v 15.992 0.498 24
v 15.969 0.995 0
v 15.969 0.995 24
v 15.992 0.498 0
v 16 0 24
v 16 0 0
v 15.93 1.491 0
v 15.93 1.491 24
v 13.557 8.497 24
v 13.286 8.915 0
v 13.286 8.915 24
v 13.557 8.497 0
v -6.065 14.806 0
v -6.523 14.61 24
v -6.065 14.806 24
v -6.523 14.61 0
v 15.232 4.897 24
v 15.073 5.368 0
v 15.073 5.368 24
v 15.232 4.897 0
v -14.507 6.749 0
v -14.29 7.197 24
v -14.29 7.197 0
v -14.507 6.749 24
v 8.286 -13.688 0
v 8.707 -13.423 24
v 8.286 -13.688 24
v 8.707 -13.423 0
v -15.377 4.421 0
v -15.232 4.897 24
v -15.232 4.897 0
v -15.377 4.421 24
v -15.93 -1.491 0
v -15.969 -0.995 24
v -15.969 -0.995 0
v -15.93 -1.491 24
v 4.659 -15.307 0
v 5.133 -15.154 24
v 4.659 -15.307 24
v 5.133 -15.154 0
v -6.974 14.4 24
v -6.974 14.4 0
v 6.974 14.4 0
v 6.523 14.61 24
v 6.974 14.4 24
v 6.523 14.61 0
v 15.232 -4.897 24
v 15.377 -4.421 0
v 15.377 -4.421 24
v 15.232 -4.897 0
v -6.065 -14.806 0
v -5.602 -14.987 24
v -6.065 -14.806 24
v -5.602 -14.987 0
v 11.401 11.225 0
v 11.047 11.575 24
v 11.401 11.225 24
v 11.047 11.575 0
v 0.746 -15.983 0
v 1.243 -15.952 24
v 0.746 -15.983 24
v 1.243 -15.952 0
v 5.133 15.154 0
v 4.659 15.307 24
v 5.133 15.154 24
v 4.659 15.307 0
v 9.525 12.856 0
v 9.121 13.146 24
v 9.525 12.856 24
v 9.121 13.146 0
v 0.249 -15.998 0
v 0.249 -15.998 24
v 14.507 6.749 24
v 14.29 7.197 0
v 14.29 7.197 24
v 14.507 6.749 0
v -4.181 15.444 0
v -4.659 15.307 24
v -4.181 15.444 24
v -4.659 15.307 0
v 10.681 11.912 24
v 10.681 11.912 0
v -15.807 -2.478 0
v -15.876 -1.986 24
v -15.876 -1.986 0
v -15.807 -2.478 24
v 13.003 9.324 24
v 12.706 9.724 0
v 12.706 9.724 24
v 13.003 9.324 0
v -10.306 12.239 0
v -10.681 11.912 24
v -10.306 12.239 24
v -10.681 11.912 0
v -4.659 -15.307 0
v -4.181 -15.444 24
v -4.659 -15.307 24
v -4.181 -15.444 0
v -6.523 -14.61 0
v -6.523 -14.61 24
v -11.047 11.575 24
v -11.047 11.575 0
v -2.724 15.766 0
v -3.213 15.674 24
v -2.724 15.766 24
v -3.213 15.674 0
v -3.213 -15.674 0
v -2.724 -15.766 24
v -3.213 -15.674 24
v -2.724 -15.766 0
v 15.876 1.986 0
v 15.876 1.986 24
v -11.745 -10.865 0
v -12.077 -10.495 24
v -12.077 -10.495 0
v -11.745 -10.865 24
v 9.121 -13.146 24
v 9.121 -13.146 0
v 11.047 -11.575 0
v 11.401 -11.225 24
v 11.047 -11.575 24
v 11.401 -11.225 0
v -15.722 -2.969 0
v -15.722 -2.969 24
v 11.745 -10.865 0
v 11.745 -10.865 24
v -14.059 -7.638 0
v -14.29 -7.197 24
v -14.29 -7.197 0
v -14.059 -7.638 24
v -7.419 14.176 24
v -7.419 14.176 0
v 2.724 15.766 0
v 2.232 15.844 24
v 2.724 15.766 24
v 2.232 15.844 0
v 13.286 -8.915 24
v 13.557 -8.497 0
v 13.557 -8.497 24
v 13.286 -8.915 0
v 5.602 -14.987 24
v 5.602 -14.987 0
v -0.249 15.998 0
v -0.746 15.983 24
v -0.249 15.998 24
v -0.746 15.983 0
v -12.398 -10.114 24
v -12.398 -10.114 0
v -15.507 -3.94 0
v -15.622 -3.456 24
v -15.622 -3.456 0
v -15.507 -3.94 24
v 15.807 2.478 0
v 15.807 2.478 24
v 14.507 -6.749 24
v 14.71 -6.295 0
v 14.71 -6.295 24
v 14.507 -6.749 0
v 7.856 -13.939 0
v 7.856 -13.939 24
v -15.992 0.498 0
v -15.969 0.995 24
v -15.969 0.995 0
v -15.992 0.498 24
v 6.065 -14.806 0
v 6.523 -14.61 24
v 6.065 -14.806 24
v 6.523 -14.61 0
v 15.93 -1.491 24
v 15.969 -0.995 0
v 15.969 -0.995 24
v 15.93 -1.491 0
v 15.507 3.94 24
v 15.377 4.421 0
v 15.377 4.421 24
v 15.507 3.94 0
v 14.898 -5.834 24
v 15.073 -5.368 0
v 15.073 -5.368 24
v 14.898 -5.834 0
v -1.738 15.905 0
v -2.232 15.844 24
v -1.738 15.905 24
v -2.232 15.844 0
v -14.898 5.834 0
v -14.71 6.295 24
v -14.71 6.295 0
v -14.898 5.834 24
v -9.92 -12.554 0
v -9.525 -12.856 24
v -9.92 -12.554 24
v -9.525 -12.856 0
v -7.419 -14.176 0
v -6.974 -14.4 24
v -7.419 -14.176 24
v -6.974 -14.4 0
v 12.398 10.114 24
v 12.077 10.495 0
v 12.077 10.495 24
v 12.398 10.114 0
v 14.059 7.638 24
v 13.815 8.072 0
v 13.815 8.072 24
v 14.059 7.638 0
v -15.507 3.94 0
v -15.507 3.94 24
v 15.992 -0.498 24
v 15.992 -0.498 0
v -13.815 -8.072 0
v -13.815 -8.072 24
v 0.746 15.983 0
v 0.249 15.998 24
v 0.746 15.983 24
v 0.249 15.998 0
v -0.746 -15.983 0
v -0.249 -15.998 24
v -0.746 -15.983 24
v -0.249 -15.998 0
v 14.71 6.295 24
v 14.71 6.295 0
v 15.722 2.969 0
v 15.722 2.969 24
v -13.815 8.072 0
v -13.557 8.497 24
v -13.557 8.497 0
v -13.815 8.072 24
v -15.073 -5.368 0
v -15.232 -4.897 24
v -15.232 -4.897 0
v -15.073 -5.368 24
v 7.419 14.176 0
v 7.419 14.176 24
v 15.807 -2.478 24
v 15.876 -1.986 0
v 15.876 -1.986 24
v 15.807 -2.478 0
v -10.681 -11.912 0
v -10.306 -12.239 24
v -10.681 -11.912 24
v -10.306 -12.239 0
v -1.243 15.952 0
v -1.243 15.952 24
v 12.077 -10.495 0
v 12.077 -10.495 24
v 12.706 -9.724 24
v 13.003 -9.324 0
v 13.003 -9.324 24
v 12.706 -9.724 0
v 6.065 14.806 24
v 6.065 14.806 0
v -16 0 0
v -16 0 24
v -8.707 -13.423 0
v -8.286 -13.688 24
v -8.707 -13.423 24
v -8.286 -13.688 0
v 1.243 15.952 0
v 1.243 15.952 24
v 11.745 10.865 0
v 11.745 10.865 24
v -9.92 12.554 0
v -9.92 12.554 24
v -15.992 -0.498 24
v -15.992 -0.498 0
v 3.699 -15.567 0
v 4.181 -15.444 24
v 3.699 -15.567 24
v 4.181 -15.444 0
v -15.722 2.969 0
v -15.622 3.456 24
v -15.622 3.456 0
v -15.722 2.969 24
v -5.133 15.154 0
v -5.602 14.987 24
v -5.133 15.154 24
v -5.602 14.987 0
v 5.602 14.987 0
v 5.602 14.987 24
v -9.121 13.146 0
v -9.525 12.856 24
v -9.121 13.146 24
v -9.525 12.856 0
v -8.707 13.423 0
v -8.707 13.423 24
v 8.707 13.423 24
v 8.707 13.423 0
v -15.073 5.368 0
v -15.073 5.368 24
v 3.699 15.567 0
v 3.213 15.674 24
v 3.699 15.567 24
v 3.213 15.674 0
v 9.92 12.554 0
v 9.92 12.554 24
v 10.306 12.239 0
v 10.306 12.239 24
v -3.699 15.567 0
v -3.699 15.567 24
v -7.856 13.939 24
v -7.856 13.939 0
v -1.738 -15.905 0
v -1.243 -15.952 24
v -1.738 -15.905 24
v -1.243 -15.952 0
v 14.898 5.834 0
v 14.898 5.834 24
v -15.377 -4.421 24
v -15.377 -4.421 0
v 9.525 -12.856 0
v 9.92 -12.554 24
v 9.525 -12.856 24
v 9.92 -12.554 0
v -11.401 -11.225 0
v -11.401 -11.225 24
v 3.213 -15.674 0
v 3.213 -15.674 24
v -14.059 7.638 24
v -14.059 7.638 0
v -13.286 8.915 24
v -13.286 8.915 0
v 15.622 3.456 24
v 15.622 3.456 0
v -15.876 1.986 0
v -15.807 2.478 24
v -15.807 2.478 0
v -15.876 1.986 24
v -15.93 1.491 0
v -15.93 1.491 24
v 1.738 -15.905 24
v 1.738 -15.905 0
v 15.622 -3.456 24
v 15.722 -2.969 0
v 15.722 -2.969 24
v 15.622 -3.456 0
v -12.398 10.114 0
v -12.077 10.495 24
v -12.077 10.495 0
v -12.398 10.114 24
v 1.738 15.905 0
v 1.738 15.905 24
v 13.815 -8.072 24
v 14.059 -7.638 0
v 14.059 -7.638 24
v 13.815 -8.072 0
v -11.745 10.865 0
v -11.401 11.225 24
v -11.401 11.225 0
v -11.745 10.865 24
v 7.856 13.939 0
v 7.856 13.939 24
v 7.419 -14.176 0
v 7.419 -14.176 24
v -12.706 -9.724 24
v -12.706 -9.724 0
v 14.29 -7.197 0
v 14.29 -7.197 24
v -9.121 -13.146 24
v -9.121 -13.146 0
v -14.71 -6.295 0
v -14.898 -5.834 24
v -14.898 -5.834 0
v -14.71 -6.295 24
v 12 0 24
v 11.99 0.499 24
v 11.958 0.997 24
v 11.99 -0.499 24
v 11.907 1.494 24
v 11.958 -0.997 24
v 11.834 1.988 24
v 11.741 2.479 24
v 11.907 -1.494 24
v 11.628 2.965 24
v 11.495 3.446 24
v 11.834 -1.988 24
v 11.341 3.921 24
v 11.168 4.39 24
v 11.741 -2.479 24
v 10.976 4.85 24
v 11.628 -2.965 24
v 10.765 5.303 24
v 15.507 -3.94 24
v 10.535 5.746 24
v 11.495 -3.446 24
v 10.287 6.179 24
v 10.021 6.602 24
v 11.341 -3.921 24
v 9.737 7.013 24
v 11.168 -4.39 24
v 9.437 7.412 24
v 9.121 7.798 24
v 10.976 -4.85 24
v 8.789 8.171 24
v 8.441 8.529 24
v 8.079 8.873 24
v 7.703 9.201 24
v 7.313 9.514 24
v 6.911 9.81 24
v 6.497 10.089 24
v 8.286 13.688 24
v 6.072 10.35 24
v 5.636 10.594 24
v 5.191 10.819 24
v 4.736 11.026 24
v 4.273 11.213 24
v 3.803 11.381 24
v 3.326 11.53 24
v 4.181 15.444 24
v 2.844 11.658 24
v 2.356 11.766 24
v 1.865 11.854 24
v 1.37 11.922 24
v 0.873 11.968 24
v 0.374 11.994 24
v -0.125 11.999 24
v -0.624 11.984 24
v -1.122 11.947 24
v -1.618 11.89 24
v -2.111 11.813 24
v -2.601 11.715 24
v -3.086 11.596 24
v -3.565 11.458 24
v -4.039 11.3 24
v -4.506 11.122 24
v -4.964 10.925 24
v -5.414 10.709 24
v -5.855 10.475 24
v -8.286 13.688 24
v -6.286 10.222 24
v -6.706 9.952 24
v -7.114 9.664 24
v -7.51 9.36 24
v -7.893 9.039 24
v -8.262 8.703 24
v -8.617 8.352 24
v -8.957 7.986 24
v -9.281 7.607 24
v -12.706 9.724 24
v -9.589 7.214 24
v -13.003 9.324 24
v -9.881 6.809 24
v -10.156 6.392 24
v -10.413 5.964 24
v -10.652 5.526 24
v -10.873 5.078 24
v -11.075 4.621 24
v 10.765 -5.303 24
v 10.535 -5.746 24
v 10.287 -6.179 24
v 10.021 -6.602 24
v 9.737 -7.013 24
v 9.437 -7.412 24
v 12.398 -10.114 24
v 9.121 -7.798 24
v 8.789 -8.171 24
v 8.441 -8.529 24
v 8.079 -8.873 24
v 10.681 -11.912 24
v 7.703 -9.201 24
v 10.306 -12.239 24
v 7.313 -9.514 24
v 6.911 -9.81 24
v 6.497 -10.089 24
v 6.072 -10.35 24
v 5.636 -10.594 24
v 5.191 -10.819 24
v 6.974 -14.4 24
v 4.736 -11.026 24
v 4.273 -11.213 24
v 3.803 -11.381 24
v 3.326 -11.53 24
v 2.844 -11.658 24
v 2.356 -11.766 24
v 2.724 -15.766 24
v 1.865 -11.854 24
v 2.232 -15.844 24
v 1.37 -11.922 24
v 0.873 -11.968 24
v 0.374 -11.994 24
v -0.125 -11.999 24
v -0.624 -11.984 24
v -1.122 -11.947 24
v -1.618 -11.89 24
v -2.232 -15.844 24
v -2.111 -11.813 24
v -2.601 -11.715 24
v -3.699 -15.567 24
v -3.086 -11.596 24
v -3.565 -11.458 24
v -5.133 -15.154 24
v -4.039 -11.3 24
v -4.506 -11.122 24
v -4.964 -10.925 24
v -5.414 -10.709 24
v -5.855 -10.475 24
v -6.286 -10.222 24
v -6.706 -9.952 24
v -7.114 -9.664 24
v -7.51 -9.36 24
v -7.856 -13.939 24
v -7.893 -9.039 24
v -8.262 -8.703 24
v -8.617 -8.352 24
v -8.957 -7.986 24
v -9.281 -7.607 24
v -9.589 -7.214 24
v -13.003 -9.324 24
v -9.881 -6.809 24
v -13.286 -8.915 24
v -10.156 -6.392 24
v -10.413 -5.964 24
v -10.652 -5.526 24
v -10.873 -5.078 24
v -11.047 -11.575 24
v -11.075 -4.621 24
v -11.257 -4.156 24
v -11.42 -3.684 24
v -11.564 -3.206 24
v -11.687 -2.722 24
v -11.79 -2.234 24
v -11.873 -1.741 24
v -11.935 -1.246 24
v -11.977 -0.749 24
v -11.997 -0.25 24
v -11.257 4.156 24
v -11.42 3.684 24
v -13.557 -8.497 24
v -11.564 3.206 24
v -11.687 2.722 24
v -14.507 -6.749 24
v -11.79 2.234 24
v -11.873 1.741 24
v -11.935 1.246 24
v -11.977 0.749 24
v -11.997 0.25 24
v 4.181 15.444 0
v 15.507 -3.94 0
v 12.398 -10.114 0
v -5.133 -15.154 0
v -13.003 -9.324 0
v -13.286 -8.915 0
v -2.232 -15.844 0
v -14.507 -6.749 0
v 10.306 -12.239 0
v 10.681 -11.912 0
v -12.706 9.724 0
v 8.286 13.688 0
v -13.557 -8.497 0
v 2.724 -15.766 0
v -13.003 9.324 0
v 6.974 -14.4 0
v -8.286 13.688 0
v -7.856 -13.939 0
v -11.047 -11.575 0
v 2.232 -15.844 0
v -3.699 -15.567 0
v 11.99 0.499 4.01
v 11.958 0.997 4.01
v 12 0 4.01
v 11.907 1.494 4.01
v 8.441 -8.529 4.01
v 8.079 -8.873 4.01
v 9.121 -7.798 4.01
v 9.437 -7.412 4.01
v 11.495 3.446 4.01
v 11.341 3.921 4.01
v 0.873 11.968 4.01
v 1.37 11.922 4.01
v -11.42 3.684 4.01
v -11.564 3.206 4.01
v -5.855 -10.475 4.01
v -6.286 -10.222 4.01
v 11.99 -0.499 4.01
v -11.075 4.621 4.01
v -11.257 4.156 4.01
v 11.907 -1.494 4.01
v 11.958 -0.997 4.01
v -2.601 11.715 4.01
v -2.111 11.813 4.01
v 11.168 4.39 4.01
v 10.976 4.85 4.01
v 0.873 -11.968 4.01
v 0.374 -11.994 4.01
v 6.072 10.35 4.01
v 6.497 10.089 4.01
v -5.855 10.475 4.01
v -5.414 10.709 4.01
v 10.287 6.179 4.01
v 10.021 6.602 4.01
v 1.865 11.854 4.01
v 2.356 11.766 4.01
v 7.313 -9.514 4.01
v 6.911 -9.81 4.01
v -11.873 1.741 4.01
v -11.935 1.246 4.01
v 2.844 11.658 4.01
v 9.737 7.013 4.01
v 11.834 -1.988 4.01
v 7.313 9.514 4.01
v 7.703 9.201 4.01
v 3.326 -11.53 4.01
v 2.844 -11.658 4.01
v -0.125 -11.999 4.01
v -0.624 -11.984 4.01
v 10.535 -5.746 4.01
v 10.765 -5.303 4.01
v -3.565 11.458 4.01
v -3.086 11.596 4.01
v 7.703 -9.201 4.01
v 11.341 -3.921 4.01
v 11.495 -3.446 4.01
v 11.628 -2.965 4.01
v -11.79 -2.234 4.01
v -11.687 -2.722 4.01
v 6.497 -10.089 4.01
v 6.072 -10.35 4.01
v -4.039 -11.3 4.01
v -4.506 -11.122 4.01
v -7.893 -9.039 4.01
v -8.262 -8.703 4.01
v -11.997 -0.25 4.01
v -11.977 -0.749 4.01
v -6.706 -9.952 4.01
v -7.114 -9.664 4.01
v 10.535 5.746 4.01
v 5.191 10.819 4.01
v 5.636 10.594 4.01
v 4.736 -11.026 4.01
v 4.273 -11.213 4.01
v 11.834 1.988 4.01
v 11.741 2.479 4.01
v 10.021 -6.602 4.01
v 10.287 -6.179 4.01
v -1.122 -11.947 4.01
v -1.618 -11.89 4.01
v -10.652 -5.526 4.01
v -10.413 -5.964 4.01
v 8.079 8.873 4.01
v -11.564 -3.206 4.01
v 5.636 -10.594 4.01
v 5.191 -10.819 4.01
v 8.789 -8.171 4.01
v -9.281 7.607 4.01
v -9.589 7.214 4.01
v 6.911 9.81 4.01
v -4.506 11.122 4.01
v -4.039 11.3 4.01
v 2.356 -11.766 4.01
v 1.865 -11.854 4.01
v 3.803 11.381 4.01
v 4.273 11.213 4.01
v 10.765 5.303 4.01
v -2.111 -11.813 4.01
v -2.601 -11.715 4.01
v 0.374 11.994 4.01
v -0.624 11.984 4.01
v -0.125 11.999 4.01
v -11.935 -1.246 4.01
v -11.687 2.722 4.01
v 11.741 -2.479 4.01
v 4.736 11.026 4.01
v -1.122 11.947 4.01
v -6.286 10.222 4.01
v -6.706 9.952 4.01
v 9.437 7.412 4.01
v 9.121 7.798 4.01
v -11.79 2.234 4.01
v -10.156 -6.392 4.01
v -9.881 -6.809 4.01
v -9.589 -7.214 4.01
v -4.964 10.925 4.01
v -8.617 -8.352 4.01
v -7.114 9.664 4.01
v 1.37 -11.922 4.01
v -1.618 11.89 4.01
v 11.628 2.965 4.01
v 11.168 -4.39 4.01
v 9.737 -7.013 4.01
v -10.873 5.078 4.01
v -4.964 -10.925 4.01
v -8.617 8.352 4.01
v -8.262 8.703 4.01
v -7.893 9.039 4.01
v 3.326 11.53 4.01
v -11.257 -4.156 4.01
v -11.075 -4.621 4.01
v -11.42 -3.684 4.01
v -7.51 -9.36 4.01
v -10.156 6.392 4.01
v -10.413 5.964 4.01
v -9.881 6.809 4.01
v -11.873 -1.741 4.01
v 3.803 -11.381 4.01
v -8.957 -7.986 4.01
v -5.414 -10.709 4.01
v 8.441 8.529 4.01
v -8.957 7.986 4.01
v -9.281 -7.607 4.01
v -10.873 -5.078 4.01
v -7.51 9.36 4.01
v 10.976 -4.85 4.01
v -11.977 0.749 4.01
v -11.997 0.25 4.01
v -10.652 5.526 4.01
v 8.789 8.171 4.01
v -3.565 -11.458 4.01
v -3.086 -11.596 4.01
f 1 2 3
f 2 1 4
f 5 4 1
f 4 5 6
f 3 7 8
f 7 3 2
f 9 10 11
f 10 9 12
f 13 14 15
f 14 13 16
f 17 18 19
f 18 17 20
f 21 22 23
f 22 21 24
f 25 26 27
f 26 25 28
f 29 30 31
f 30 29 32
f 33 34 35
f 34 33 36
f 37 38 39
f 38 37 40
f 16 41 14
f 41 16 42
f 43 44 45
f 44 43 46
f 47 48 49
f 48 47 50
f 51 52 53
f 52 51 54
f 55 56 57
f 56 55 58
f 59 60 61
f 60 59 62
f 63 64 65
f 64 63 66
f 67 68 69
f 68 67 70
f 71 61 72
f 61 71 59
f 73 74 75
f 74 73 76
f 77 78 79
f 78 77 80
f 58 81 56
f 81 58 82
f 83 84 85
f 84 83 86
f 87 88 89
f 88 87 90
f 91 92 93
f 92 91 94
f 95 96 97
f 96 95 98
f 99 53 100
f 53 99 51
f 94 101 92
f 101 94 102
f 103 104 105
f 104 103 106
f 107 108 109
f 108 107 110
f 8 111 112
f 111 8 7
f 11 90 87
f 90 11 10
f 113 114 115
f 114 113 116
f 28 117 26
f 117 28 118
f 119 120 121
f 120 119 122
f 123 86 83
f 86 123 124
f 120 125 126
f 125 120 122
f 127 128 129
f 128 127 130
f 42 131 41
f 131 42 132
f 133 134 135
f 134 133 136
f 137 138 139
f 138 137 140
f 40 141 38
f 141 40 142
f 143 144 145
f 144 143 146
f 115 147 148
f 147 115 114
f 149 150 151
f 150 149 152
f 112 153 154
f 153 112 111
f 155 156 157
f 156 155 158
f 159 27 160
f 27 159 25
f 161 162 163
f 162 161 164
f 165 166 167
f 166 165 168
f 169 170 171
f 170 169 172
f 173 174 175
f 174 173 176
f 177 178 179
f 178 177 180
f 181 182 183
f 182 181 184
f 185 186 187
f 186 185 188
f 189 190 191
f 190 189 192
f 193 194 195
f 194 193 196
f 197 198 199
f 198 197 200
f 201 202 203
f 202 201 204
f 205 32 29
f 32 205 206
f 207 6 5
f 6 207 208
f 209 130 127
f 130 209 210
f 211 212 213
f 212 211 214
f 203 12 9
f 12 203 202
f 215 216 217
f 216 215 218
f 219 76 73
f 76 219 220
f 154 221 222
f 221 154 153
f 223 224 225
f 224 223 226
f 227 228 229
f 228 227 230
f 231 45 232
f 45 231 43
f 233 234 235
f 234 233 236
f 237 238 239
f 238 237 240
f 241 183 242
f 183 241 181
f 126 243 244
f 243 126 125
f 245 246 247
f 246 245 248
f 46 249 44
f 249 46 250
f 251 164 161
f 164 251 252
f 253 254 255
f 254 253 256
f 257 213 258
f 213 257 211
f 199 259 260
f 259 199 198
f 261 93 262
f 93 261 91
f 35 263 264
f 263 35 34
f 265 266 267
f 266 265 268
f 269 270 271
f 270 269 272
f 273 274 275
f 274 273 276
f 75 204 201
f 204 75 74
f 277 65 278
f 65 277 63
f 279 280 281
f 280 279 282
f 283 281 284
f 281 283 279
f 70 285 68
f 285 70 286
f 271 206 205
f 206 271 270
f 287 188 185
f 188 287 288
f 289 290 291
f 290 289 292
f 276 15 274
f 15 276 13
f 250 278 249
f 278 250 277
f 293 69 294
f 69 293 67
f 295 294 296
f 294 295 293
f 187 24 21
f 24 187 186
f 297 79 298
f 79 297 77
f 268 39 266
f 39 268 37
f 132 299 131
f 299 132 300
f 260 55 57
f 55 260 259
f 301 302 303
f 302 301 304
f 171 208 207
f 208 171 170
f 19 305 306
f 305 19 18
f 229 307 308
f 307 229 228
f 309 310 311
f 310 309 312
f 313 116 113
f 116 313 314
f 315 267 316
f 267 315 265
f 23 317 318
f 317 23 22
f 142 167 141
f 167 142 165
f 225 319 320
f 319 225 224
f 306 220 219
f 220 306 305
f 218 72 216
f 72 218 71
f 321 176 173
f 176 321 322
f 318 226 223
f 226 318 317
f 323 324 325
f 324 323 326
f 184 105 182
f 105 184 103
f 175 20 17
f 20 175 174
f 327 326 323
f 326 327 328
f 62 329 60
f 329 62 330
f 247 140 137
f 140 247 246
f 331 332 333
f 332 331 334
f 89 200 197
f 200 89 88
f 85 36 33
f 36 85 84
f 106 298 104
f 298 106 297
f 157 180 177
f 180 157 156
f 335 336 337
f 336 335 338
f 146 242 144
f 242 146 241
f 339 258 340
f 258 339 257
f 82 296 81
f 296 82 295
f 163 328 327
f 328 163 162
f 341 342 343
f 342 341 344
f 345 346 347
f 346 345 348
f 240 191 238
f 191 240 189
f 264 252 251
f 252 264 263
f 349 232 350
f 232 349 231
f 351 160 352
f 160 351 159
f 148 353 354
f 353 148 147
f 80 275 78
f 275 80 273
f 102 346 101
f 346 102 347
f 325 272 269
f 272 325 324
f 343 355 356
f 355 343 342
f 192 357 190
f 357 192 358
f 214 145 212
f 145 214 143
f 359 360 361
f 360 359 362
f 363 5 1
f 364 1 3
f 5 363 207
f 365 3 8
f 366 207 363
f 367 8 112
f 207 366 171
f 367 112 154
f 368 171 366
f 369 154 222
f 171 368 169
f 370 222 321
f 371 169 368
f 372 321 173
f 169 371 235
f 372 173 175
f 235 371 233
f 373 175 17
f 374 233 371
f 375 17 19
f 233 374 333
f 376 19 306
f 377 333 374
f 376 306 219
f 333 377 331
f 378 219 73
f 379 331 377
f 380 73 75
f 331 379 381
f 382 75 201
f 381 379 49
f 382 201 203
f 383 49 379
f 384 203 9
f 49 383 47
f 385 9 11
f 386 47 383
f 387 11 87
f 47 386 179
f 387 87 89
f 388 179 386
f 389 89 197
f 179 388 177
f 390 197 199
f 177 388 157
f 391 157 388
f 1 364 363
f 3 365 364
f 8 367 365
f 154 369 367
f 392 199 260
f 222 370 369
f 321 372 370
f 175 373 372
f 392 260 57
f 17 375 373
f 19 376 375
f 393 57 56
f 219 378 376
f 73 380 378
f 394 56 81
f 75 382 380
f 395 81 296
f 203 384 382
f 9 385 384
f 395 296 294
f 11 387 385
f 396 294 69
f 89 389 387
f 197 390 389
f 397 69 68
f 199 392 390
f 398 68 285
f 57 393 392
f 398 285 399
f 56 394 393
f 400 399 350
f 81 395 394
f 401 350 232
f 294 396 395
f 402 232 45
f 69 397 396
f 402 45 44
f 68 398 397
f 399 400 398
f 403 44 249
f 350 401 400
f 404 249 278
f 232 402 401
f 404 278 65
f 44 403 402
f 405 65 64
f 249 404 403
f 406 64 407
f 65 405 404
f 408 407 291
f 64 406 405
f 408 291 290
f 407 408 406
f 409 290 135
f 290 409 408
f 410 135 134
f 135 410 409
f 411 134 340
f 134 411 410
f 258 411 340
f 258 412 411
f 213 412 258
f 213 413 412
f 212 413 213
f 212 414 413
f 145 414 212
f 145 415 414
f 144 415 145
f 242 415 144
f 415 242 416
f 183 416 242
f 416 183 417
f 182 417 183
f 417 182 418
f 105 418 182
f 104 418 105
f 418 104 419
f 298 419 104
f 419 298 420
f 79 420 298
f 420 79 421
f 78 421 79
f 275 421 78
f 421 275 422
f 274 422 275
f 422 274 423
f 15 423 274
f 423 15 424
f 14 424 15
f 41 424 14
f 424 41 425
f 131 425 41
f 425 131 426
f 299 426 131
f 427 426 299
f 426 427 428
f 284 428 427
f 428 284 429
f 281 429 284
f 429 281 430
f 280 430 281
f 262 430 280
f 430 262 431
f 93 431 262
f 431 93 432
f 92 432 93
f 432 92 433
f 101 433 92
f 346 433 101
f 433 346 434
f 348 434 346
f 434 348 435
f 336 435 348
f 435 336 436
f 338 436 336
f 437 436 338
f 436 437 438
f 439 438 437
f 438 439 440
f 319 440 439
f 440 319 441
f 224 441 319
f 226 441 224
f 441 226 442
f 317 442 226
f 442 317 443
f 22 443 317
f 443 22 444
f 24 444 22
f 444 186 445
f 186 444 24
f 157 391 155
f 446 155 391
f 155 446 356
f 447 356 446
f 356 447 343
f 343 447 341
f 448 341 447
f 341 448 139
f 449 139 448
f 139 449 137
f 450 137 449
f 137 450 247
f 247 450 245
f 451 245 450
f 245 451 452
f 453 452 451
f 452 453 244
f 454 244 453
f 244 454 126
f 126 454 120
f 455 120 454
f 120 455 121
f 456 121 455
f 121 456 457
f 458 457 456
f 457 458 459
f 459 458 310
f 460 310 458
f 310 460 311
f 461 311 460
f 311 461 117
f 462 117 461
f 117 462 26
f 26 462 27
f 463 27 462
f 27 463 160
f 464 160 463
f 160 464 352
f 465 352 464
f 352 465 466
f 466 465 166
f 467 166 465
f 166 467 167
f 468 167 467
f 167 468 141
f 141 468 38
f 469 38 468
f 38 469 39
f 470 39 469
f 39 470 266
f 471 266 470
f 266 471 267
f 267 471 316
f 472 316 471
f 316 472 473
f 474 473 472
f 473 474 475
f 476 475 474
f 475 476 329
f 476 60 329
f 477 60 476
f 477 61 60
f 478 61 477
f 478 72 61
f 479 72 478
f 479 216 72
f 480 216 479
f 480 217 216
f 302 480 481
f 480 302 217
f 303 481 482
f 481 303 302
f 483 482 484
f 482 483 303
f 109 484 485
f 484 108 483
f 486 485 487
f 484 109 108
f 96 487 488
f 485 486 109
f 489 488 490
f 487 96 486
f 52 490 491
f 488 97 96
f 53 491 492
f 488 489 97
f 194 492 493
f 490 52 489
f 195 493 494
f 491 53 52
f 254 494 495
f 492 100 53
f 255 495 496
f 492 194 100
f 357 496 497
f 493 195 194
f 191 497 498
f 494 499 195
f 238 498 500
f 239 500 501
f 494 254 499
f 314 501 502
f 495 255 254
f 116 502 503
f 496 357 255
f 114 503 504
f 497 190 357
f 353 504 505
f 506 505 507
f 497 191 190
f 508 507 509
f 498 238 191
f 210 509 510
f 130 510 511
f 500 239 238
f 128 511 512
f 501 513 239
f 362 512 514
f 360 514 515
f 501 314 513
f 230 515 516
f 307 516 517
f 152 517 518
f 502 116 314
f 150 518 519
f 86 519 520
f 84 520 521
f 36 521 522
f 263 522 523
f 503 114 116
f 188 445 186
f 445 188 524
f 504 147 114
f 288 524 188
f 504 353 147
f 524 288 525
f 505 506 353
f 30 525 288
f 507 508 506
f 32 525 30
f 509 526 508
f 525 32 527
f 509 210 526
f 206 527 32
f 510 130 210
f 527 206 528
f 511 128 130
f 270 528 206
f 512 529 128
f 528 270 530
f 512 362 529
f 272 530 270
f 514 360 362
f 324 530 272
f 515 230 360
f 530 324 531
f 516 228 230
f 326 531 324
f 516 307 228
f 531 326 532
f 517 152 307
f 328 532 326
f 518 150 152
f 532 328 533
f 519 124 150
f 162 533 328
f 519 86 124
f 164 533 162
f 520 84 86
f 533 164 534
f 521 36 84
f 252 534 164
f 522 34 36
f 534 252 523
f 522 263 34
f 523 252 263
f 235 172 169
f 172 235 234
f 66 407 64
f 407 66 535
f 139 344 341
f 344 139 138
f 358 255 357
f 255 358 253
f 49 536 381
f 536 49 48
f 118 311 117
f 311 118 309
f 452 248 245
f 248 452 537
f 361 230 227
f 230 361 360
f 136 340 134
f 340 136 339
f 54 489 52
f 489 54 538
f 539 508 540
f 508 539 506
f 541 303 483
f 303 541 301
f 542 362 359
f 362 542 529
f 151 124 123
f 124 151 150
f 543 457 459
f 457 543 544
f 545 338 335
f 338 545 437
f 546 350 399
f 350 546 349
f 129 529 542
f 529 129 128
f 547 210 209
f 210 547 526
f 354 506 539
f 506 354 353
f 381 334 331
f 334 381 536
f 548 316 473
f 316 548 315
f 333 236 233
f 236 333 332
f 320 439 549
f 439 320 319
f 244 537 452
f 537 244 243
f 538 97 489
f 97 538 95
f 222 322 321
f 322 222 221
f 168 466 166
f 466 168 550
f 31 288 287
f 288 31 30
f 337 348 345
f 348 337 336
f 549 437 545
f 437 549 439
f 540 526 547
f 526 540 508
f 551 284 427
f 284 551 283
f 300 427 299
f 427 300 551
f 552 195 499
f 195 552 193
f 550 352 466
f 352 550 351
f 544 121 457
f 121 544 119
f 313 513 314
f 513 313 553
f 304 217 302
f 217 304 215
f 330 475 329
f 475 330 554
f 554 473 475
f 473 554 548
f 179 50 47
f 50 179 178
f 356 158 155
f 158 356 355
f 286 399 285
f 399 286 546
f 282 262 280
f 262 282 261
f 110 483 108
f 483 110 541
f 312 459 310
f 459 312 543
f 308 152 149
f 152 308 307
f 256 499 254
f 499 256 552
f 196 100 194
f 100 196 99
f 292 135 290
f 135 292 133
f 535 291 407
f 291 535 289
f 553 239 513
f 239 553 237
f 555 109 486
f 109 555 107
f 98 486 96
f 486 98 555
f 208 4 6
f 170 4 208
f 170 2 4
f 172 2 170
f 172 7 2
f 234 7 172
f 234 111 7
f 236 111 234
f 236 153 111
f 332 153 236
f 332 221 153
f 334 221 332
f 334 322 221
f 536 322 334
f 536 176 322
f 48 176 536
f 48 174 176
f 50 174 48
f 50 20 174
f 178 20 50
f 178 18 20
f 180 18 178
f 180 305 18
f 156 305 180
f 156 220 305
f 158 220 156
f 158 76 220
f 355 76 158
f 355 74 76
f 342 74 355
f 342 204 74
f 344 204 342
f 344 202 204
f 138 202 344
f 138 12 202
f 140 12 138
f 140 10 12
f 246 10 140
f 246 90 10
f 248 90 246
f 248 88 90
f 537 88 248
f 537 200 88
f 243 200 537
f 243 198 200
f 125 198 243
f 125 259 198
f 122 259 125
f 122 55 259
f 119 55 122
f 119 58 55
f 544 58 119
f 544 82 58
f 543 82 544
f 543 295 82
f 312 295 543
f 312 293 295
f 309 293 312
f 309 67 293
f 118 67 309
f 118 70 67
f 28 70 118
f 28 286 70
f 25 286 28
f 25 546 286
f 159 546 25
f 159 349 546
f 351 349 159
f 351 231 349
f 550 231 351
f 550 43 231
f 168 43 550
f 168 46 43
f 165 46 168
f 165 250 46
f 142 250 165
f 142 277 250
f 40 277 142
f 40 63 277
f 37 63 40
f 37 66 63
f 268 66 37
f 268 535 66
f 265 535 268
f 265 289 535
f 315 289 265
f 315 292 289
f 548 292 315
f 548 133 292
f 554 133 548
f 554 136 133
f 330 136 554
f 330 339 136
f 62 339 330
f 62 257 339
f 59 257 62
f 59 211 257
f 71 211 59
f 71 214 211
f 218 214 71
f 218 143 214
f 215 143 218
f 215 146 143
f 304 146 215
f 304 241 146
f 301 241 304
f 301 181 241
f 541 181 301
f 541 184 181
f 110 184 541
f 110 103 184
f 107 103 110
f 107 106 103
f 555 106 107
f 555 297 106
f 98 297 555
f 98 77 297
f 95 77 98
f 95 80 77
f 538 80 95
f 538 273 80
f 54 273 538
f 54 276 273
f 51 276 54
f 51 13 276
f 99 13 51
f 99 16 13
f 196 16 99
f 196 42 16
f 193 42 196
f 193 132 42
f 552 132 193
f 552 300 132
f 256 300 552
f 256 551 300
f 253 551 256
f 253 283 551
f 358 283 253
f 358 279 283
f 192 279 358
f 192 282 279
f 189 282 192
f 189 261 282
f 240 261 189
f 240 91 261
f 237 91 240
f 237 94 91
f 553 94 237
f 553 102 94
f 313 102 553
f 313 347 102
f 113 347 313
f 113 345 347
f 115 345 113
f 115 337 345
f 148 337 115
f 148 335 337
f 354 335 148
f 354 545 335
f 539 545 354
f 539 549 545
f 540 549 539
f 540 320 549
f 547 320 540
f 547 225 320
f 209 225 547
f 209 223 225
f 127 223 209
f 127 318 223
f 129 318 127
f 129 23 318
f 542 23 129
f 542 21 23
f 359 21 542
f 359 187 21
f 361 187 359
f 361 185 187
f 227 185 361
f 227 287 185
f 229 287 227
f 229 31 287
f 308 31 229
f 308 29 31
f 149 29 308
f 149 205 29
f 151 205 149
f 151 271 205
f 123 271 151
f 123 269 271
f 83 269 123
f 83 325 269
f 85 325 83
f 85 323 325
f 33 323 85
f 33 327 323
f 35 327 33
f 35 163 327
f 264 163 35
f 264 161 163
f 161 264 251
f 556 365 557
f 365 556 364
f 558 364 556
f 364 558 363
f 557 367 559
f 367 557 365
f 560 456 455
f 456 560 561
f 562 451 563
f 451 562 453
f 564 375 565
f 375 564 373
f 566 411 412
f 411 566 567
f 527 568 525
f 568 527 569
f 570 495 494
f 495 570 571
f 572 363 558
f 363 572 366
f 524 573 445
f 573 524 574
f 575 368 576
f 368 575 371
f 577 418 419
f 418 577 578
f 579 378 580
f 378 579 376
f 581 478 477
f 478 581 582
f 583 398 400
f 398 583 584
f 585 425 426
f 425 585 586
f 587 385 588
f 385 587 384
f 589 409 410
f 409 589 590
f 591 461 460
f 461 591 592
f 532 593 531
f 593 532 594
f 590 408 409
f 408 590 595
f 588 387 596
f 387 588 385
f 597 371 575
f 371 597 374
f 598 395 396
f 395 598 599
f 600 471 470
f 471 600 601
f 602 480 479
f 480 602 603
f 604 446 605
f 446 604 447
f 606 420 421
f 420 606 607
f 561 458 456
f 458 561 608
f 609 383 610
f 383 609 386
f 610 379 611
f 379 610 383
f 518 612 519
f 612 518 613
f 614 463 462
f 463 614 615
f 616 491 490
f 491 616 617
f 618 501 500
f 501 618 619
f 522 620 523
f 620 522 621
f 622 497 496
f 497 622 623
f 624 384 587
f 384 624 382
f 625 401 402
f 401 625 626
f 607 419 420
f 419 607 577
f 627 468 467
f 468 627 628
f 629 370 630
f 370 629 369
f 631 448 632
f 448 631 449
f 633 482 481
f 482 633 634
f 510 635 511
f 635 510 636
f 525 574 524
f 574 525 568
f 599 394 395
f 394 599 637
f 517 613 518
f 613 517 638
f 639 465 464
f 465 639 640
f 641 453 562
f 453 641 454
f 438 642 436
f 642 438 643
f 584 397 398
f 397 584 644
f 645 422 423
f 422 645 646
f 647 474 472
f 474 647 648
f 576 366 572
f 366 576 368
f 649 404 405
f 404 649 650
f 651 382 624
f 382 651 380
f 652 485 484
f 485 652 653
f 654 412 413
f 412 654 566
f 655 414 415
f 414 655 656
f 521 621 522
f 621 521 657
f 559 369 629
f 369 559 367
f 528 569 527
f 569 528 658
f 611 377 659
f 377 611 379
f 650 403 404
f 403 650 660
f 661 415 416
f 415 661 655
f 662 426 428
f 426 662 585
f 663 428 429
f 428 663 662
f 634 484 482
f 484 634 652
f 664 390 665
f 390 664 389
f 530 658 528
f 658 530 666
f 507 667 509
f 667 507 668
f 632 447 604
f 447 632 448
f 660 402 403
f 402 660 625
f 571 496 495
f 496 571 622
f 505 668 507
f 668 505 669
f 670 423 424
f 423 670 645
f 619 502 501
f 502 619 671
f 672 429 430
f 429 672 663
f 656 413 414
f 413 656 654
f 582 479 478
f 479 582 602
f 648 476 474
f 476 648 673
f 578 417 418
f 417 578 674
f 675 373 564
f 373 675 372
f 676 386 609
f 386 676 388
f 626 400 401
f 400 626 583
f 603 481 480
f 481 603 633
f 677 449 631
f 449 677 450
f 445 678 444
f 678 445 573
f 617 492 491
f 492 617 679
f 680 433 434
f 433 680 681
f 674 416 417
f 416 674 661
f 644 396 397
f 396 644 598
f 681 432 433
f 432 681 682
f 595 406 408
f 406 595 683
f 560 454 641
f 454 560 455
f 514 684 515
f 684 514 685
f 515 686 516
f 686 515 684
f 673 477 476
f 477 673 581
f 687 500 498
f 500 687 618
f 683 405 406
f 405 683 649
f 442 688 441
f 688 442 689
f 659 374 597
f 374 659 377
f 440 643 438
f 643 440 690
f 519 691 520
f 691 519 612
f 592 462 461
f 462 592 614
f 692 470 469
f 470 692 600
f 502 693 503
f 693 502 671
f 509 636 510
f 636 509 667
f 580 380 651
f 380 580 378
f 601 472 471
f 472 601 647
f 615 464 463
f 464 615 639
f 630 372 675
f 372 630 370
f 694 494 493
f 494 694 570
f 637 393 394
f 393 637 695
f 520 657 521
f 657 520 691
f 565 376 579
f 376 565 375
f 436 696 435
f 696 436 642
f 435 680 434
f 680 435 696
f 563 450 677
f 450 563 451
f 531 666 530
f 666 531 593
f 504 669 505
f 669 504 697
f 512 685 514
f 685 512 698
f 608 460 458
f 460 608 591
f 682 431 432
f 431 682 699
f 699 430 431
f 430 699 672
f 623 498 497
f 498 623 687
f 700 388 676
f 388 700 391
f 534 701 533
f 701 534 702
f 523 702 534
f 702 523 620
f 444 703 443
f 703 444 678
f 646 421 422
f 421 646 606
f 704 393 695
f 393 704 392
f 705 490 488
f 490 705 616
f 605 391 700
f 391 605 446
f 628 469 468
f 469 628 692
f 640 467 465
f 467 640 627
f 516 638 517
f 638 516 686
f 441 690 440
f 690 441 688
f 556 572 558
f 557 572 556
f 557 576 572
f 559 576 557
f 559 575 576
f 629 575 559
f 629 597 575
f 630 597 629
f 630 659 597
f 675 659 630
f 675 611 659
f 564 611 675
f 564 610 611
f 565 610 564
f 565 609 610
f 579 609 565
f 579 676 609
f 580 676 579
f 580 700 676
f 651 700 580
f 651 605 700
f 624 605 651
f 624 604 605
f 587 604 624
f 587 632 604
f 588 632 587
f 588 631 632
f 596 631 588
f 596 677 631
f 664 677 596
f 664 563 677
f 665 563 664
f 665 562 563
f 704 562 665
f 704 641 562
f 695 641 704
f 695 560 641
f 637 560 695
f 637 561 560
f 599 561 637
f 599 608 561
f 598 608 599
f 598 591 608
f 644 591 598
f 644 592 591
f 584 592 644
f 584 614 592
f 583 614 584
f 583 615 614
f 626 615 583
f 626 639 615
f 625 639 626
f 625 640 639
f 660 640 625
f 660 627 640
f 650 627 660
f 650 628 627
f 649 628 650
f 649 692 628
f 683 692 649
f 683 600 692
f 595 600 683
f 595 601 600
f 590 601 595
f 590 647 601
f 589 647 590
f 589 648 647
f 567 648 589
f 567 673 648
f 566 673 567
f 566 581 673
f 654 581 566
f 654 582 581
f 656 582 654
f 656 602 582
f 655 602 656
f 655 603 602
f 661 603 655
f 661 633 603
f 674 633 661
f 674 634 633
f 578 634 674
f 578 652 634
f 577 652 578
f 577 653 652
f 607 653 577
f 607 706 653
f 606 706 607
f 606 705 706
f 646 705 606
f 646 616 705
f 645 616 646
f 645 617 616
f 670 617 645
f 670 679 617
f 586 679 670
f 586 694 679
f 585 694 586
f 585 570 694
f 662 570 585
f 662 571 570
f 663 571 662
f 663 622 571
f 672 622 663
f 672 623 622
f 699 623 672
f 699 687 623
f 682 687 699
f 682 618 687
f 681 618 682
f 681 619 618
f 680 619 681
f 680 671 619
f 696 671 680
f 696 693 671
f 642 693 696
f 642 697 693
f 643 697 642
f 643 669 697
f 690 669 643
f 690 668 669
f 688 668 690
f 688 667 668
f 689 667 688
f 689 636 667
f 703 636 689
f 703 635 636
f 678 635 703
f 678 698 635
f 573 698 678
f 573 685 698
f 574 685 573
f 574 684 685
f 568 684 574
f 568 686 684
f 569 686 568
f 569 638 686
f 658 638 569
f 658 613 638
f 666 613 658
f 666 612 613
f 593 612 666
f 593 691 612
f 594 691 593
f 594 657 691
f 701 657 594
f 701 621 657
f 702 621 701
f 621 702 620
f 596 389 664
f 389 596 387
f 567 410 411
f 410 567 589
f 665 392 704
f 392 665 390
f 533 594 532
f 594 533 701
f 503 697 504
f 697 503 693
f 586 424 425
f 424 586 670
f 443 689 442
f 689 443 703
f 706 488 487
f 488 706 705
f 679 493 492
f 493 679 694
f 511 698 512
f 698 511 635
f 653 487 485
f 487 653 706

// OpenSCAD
module umbrella_top (d = 24, hi = 20, w = 4)
{
    difference () {
        cylinder (r = d/2 + w, h=hi + w);
        translate ([0, 0, w + 0.01])
            cylinder (r = d/2, h=hi);
    }
}

umbrella_top ($fa = 1, $fs = .5);
